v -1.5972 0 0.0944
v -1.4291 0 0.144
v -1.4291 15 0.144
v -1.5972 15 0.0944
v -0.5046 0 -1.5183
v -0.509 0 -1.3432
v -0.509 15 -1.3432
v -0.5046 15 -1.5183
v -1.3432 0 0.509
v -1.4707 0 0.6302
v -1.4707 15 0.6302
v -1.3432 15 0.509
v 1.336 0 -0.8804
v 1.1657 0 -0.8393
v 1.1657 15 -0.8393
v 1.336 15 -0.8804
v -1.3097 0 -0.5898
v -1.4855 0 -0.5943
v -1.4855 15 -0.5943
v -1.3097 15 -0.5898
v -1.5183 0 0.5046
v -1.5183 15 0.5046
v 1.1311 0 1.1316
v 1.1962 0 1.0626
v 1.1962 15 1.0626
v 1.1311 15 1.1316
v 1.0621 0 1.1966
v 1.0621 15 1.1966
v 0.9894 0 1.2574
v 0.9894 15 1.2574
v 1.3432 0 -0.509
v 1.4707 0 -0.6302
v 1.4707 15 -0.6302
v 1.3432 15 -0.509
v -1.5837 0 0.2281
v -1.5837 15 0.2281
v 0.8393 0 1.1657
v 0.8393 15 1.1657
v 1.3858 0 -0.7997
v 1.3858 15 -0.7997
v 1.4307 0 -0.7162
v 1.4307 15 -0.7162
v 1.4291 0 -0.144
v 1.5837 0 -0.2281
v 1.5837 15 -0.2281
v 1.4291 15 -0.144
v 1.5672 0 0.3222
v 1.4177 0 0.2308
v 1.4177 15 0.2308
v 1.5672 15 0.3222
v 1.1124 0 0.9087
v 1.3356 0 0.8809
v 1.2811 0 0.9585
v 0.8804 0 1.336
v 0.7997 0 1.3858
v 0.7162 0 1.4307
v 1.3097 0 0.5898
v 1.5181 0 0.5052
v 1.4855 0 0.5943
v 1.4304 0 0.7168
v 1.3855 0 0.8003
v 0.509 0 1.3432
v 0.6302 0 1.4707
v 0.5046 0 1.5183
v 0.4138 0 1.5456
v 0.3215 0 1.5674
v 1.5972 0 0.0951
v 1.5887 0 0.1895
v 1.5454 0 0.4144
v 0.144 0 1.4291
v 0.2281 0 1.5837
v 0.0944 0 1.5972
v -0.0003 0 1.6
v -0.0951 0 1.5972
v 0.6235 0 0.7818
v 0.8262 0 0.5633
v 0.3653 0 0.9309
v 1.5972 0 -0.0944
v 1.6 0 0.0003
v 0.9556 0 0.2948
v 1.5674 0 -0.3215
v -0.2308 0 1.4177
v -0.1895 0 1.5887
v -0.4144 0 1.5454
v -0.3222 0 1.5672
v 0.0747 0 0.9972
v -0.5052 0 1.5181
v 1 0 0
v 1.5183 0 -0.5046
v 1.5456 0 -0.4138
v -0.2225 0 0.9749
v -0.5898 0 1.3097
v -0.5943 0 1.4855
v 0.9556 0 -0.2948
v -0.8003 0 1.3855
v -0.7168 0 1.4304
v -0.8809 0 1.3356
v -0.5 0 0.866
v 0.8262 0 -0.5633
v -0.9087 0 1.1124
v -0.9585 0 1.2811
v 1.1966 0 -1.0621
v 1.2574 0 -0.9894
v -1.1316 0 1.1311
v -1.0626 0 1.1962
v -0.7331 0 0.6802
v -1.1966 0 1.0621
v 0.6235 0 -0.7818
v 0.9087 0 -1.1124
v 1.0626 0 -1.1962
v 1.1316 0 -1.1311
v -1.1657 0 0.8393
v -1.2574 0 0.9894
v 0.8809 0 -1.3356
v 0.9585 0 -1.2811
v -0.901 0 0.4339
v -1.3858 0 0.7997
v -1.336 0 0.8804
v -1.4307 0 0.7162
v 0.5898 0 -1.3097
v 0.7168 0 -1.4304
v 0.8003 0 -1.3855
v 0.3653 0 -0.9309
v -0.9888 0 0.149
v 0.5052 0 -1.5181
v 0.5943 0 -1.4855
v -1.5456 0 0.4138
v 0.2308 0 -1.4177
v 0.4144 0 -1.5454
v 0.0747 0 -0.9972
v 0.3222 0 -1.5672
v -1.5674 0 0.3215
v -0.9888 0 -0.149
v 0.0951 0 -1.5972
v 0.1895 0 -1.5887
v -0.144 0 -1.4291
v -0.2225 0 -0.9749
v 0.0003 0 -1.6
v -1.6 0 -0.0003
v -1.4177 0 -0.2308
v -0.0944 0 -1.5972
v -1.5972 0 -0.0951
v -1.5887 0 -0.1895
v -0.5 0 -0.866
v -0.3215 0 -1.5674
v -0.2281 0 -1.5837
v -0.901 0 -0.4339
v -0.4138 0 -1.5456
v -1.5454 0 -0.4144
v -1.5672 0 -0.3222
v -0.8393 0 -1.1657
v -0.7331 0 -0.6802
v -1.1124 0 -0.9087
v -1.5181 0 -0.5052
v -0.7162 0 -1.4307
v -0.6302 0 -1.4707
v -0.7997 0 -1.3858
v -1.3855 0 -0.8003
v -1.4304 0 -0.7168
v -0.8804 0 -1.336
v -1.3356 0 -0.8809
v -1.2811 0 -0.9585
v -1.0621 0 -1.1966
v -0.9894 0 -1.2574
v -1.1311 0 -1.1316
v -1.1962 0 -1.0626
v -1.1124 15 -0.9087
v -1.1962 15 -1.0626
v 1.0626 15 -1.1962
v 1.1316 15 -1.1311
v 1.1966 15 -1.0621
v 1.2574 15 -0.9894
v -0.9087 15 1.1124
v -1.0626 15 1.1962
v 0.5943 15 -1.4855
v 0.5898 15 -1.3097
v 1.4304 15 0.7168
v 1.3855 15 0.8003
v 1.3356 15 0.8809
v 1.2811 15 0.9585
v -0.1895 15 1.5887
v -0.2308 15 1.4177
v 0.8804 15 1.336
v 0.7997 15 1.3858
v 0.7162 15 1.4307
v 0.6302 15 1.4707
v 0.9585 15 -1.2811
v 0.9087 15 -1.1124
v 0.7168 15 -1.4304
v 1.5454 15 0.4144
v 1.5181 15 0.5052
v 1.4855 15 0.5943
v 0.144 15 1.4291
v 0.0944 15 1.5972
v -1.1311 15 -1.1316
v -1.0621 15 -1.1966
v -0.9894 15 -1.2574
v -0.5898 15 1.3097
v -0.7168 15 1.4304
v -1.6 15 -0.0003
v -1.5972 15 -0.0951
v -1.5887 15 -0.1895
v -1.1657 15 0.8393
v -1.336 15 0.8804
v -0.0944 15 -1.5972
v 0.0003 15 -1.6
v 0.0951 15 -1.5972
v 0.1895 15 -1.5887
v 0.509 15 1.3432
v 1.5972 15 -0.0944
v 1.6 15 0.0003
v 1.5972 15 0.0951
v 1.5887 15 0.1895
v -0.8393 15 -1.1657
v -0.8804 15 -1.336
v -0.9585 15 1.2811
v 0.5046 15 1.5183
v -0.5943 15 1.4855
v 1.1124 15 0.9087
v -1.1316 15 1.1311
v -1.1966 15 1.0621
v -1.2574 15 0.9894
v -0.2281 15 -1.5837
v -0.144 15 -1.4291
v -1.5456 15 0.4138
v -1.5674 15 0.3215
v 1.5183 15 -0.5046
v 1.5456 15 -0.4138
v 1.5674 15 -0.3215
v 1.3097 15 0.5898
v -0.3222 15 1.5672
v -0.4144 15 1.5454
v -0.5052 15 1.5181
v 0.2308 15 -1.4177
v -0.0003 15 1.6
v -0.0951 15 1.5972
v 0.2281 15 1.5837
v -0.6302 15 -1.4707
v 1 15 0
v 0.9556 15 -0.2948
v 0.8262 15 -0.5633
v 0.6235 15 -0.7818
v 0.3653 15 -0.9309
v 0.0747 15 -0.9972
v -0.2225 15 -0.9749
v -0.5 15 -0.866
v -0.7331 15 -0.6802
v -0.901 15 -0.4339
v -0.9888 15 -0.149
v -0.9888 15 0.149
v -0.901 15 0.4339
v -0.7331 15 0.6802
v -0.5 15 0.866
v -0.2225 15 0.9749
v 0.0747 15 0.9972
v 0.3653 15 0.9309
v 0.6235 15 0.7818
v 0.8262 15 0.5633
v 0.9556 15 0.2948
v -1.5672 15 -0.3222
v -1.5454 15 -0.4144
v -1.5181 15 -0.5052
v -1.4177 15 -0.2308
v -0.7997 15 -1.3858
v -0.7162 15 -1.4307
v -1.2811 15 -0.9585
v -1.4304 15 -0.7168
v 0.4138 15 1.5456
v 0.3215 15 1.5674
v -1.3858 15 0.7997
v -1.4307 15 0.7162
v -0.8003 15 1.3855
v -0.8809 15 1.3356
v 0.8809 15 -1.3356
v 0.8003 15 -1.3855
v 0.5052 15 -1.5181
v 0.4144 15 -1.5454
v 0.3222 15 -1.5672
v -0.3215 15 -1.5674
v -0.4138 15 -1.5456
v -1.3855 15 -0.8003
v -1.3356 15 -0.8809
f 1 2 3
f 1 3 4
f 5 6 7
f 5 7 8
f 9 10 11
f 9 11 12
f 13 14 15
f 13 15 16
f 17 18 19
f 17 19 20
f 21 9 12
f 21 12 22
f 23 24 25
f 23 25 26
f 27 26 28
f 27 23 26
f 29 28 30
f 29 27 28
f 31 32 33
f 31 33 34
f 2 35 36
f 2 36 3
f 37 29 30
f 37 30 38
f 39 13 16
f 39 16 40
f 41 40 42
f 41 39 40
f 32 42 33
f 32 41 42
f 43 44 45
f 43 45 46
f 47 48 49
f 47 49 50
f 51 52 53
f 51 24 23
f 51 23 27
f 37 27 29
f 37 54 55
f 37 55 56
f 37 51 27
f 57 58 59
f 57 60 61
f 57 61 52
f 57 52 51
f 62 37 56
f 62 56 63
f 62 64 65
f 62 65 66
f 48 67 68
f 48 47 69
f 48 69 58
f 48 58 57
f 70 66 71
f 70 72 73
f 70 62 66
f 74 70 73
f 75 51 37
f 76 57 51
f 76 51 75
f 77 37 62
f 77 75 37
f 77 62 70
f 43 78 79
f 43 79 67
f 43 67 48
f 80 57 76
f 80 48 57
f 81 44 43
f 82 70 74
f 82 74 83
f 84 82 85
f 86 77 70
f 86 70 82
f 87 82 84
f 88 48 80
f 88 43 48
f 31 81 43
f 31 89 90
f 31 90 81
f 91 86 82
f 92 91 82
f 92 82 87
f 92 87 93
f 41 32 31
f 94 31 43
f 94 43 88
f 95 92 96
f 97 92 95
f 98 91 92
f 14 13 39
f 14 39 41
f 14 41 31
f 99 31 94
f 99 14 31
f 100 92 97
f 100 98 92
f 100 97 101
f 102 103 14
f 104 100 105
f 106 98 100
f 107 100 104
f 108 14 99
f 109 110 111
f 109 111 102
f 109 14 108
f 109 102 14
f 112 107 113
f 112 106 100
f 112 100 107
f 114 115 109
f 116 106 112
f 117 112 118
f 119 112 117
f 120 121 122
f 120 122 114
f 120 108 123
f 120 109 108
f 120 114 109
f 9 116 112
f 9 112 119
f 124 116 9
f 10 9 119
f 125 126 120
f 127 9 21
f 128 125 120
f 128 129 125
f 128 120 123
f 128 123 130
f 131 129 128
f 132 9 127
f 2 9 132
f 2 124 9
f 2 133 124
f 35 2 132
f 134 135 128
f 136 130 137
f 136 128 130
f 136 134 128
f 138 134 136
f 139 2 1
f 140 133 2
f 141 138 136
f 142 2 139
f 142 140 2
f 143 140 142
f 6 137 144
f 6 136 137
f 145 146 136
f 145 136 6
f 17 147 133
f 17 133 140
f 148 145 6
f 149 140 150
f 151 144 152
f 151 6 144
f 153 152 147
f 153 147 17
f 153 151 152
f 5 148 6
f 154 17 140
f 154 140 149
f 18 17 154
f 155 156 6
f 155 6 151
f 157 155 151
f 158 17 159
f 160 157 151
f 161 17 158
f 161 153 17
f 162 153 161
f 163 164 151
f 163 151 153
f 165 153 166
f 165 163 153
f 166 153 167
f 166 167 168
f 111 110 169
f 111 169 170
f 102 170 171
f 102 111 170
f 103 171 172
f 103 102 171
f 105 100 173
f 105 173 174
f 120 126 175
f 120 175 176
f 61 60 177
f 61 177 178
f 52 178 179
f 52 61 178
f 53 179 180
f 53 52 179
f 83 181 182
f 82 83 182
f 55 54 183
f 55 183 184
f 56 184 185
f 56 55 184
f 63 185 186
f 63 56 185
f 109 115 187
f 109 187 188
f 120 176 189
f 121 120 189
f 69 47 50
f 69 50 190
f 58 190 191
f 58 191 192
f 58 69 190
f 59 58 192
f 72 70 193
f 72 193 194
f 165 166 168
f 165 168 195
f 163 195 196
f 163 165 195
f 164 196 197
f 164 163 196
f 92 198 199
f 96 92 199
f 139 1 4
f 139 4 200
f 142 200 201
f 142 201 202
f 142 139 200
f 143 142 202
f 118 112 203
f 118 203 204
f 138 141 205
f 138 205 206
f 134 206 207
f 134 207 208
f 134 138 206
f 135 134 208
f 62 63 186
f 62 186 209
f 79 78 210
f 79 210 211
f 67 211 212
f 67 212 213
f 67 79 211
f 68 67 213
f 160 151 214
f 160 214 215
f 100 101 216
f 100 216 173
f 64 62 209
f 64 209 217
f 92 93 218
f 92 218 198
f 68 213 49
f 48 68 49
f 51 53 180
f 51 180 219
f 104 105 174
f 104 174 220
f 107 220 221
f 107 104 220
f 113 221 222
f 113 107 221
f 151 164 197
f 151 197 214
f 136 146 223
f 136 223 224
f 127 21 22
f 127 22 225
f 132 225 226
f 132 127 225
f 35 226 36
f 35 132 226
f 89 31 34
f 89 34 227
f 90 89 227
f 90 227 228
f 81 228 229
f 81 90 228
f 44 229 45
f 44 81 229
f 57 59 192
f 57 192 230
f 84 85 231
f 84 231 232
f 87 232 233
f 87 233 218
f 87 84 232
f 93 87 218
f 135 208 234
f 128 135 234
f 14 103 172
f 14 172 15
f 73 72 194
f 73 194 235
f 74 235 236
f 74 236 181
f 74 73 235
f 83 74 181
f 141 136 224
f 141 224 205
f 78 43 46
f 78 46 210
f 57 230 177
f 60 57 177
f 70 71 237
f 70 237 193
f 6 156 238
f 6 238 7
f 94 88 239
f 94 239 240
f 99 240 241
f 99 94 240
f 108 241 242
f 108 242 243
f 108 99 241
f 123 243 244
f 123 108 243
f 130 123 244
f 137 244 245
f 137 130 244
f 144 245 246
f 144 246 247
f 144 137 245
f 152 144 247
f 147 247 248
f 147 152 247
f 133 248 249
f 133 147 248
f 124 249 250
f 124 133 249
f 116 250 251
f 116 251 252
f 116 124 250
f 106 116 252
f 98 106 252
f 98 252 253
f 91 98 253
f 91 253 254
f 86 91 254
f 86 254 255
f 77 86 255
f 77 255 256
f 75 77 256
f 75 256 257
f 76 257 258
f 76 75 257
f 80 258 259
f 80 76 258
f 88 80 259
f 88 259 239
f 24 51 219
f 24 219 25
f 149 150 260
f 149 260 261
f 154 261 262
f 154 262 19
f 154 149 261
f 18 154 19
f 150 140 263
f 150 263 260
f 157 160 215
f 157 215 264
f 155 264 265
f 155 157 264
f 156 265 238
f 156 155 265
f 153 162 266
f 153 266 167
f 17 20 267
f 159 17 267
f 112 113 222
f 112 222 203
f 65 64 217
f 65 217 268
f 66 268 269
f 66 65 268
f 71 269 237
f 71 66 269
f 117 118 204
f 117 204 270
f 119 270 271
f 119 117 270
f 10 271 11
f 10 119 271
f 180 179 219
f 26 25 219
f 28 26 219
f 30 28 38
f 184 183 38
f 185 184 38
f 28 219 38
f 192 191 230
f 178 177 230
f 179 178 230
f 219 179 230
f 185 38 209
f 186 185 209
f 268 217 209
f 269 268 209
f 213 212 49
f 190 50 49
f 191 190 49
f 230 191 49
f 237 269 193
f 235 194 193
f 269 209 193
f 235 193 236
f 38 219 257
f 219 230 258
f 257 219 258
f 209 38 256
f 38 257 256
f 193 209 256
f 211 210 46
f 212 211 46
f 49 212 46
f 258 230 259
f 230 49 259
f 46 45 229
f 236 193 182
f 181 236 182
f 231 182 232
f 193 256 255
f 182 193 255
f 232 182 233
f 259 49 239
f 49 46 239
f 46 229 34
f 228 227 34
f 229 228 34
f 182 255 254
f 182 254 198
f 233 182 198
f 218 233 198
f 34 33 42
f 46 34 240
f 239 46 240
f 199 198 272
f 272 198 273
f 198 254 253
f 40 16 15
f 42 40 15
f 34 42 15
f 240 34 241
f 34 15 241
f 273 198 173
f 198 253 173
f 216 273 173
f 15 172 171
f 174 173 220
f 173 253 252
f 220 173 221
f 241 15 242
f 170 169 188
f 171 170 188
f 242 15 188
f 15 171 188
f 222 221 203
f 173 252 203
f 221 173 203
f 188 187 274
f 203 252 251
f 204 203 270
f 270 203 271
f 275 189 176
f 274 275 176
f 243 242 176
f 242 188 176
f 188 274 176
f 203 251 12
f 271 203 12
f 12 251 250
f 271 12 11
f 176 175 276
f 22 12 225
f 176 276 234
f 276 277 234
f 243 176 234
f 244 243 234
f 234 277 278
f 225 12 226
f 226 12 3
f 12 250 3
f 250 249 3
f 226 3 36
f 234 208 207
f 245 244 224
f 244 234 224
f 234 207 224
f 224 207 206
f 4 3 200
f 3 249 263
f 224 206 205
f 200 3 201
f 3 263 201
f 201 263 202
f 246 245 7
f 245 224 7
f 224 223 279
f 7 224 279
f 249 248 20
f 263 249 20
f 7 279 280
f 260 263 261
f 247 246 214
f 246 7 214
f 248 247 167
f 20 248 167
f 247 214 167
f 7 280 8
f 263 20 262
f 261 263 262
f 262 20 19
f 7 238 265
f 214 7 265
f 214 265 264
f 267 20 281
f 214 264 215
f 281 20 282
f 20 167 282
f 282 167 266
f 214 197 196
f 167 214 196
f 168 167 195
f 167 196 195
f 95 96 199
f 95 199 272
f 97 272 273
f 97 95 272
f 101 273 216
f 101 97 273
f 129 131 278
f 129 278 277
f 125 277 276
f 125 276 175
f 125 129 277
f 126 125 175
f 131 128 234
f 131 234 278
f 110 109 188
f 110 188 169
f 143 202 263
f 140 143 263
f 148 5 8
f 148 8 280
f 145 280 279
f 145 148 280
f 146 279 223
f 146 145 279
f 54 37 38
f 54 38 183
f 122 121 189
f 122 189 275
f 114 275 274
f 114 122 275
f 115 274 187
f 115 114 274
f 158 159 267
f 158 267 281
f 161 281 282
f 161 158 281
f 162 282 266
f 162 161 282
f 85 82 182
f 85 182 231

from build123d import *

# Parameters (mm, degrees)
SKETCH_1_R      = 1
EXTRUDE_1_DEPTH = 15


with BuildPart() as part:
    # 草图1 → 凸台-拉伸1 (new body)
    with BuildSketch(Plane(origin=(0, 0, 0), x_dir=(1, 0, 0), z_dir=(0, 1, 0))):
        with BuildLine():
            Line((-0.228121034, 1.583654253), (-0.144036994, 1.429143956))
            Line((-0.144036994, 1.429143956), (-0.094428358, 1.597211096))
            ThreePointArc((-0.094428358, 1.597211096), (0.047740264, 1.599287612), (0.189531883, 1.588734611))
            Line((0.189531883, 1.588734611), (0.230760622, 1.417726573))
            Line((0.230760622, 1.417726573), (0.322177861, 1.567227305))
            ThreePointArc((0.322177861, 1.567227305), (0.460039647, 1.532437119), (0.594268516, 1.485545331))
            Line((0.594268516, 1.485545331), (0.589832282, 1.309693468))
            Line((0.589832282, 1.309693468), (0.716828191, 1.430439563))
            ThreePointArc((0.716828191, 1.430439563), (0.840988088, 1.361153568), (0.958506731, 1.281118592))
            Line((0.958506731, 1.281118592), (0.908707847, 1.112406917))
            Line((0.908707847, 1.112406917), (1.062627865, 1.196169729))
            ThreePointArc((1.062627865, 1.196169729), (1.16462458, 1.097109651), (1.257424297, 0.989385738))
            Line((1.257424297, 0.989385738), (1.165656474, 0.839311673))
            Line((1.165656474, 0.839311673), (1.336011205, 0.880382905))
            ThreePointArc((1.336011205, 0.880382905), (1.408893832, 0.758299525), (1.470650475, 0.63022788))
            Line((1.470650475, 0.63022788), (1.343167539, 0.509018726))
            Line((1.343167539, 0.509018726), (1.51834759, 0.504599441))
            ThreePointArc((1.51834759, 0.504599441), (1.557149298, 0.367812539), (1.583654253, 0.228121034))
            Line((1.583654253, 0.228121034), (1.429143956, 0.144036994))
            Line((1.429143956, 0.144036994), (1.597211096, 0.094428358))
            ThreePointArc((1.597211096, 0.094428358), (1.599287612, -0.047740264), (1.588734611, -0.189531883))
            Line((1.588734611, -0.189531883), (1.417726573, -0.230760622))
            Line((1.417726573, -0.230760622), (1.567227305, -0.322177861))
            ThreePointArc((1.567227305, -0.322177861), (1.532437119, -0.460039647), (1.485545331, -0.594268516))
            Line((1.485545331, -0.594268516), (1.309693468, -0.589832282))
            Line((1.309693468, -0.589832282), (1.430439563, -0.716828191))
            ThreePointArc((1.430439563, -0.716828191), (1.361153568, -0.840988088), (1.281118592, -0.958506731))
            Line((1.281118592, -0.958506731), (1.112406917, -0.908707847))
            Line((1.112406917, -0.908707847), (1.196169729, -1.062627865))
            ThreePointArc((1.196169729, -1.062627865), (1.097109651, -1.16462458), (0.989385738, -1.257424297))
            Line((0.989385738, -1.257424297), (0.839311673, -1.165656474))
            Line((0.839311673, -1.165656474), (0.880382905, -1.336011205))
            ThreePointArc((0.880382905, -1.336011205), (0.758299525, -1.408893832), (0.63022788, -1.470650475))
            Line((0.63022788, -1.470650475), (0.509018726, -1.343167539))
            Line((0.509018726, -1.343167539), (0.504599441, -1.51834759))
            ThreePointArc((0.504599441, -1.51834759), (0.367812539, -1.557149298), (0.228121034, -1.583654253))
            Line((0.228121034, -1.583654253), (0.144036994, -1.429143956))
            Line((0.144036994, -1.429143956), (0.094428358, -1.597211096))
            ThreePointArc((0.094428358, -1.597211096), (-0.047740264, -1.599287612), (-0.189531883, -1.588734611))
            Line((-0.189531883, -1.588734611), (-0.230760622, -1.417726573))
            Line((-0.230760622, -1.417726573), (-0.322177861, -1.567227305))
            ThreePointArc((-0.322177861, -1.567227305), (-0.460039647, -1.532437119), (-0.594268516, -1.485545331))
            Line((-0.594268516, -1.485545331), (-0.589832282, -1.309693468))
            Line((-0.589832282, -1.309693468), (-0.716828191, -1.430439563))
            ThreePointArc((-0.716828191, -1.430439563), (-0.840988088, -1.361153568), (-0.958506731, -1.281118592))
            Line((-0.958506731, -1.281118592), (-0.908707847, -1.112406917))
            Line((-0.908707847, -1.112406917), (-1.062627865, -1.196169729))
            ThreePointArc((-1.062627865, -1.196169729), (-1.16462458, -1.097109651), (-1.257424297, -0.989385738))
            Line((-1.257424297, -0.989385738), (-1.165656474, -0.839311673))
            Line((-1.165656474, -0.839311673), (-1.336011205, -0.880382905))
            ThreePointArc((-1.336011205, -0.880382905), (-1.408893832, -0.758299525), (-1.470650475, -0.63022788))
            Line((-1.470650475, -0.63022788), (-1.343167539, -0.509018726))
            Line((-1.343167539, -0.509018726), (-1.51834759, -0.504599441))
            ThreePointArc((-1.51834759, -0.504599441), (-1.557149298, -0.367812539), (-1.583654253, -0.228121034))
            Line((-1.583654253, -0.228121034), (-1.429143956, -0.144036994))
            Line((-1.429143956, -0.144036994), (-1.597211096, -0.094428358))
            ThreePointArc((-1.597211096, -0.094428358), (-1.599287612, 0.047740264), (-1.588734611, 0.189531883))
            Line((-1.588734611, 0.189531883), (-1.417726573, 0.230760622))
            Line((-1.417726573, 0.230760622), (-1.567227305, 0.322177861))
            ThreePointArc((-1.567227305, 0.322177861), (-1.532437119, 0.460039647), (-1.485545331, 0.594268516))
            Line((-1.485545331, 0.594268516), (-1.309693468, 0.589832282))
            Line((-1.309693468, 0.589832282), (-1.430439563, 0.716828191))
            ThreePointArc((-1.430439563, 0.716828191), (-1.361153568, 0.840988088), (-1.281118592, 0.958506731))
            Line((-1.281118592, 0.958506731), (-1.112406917, 0.908707847))
            Line((-1.112406917, 0.908707847), (-1.196169729, 1.062627865))
            ThreePointArc((-1.196169729, 1.062627865), (-1.097109651, 1.16462458), (-0.989385738, 1.257424297))
            Line((-0.989385738, 1.257424297), (-0.839311673, 1.165656474))
            Line((-0.839311673, 1.165656474), (-0.880382905, 1.336011205))
            ThreePointArc((-0.880382905, 1.336011205), (-0.758299525, 1.408893832), (-0.63022788, 1.470650475))
            Line((-0.63022788, 1.470650475), (-0.509018726, 1.343167539))
            Line((-0.509018726, 1.343167539), (-0.504599441, 1.51834759))
            ThreePointArc((-0.504599441, 1.51834759), (-0.367812539, 1.557149298), (-0.228121034, 1.583654253))
        make_face()
        Circle(SKETCH_1_R, mode=Mode.SUBTRACT)
    extrude(amount=EXTRUDE_1_DEPTH)


solid = part.part
